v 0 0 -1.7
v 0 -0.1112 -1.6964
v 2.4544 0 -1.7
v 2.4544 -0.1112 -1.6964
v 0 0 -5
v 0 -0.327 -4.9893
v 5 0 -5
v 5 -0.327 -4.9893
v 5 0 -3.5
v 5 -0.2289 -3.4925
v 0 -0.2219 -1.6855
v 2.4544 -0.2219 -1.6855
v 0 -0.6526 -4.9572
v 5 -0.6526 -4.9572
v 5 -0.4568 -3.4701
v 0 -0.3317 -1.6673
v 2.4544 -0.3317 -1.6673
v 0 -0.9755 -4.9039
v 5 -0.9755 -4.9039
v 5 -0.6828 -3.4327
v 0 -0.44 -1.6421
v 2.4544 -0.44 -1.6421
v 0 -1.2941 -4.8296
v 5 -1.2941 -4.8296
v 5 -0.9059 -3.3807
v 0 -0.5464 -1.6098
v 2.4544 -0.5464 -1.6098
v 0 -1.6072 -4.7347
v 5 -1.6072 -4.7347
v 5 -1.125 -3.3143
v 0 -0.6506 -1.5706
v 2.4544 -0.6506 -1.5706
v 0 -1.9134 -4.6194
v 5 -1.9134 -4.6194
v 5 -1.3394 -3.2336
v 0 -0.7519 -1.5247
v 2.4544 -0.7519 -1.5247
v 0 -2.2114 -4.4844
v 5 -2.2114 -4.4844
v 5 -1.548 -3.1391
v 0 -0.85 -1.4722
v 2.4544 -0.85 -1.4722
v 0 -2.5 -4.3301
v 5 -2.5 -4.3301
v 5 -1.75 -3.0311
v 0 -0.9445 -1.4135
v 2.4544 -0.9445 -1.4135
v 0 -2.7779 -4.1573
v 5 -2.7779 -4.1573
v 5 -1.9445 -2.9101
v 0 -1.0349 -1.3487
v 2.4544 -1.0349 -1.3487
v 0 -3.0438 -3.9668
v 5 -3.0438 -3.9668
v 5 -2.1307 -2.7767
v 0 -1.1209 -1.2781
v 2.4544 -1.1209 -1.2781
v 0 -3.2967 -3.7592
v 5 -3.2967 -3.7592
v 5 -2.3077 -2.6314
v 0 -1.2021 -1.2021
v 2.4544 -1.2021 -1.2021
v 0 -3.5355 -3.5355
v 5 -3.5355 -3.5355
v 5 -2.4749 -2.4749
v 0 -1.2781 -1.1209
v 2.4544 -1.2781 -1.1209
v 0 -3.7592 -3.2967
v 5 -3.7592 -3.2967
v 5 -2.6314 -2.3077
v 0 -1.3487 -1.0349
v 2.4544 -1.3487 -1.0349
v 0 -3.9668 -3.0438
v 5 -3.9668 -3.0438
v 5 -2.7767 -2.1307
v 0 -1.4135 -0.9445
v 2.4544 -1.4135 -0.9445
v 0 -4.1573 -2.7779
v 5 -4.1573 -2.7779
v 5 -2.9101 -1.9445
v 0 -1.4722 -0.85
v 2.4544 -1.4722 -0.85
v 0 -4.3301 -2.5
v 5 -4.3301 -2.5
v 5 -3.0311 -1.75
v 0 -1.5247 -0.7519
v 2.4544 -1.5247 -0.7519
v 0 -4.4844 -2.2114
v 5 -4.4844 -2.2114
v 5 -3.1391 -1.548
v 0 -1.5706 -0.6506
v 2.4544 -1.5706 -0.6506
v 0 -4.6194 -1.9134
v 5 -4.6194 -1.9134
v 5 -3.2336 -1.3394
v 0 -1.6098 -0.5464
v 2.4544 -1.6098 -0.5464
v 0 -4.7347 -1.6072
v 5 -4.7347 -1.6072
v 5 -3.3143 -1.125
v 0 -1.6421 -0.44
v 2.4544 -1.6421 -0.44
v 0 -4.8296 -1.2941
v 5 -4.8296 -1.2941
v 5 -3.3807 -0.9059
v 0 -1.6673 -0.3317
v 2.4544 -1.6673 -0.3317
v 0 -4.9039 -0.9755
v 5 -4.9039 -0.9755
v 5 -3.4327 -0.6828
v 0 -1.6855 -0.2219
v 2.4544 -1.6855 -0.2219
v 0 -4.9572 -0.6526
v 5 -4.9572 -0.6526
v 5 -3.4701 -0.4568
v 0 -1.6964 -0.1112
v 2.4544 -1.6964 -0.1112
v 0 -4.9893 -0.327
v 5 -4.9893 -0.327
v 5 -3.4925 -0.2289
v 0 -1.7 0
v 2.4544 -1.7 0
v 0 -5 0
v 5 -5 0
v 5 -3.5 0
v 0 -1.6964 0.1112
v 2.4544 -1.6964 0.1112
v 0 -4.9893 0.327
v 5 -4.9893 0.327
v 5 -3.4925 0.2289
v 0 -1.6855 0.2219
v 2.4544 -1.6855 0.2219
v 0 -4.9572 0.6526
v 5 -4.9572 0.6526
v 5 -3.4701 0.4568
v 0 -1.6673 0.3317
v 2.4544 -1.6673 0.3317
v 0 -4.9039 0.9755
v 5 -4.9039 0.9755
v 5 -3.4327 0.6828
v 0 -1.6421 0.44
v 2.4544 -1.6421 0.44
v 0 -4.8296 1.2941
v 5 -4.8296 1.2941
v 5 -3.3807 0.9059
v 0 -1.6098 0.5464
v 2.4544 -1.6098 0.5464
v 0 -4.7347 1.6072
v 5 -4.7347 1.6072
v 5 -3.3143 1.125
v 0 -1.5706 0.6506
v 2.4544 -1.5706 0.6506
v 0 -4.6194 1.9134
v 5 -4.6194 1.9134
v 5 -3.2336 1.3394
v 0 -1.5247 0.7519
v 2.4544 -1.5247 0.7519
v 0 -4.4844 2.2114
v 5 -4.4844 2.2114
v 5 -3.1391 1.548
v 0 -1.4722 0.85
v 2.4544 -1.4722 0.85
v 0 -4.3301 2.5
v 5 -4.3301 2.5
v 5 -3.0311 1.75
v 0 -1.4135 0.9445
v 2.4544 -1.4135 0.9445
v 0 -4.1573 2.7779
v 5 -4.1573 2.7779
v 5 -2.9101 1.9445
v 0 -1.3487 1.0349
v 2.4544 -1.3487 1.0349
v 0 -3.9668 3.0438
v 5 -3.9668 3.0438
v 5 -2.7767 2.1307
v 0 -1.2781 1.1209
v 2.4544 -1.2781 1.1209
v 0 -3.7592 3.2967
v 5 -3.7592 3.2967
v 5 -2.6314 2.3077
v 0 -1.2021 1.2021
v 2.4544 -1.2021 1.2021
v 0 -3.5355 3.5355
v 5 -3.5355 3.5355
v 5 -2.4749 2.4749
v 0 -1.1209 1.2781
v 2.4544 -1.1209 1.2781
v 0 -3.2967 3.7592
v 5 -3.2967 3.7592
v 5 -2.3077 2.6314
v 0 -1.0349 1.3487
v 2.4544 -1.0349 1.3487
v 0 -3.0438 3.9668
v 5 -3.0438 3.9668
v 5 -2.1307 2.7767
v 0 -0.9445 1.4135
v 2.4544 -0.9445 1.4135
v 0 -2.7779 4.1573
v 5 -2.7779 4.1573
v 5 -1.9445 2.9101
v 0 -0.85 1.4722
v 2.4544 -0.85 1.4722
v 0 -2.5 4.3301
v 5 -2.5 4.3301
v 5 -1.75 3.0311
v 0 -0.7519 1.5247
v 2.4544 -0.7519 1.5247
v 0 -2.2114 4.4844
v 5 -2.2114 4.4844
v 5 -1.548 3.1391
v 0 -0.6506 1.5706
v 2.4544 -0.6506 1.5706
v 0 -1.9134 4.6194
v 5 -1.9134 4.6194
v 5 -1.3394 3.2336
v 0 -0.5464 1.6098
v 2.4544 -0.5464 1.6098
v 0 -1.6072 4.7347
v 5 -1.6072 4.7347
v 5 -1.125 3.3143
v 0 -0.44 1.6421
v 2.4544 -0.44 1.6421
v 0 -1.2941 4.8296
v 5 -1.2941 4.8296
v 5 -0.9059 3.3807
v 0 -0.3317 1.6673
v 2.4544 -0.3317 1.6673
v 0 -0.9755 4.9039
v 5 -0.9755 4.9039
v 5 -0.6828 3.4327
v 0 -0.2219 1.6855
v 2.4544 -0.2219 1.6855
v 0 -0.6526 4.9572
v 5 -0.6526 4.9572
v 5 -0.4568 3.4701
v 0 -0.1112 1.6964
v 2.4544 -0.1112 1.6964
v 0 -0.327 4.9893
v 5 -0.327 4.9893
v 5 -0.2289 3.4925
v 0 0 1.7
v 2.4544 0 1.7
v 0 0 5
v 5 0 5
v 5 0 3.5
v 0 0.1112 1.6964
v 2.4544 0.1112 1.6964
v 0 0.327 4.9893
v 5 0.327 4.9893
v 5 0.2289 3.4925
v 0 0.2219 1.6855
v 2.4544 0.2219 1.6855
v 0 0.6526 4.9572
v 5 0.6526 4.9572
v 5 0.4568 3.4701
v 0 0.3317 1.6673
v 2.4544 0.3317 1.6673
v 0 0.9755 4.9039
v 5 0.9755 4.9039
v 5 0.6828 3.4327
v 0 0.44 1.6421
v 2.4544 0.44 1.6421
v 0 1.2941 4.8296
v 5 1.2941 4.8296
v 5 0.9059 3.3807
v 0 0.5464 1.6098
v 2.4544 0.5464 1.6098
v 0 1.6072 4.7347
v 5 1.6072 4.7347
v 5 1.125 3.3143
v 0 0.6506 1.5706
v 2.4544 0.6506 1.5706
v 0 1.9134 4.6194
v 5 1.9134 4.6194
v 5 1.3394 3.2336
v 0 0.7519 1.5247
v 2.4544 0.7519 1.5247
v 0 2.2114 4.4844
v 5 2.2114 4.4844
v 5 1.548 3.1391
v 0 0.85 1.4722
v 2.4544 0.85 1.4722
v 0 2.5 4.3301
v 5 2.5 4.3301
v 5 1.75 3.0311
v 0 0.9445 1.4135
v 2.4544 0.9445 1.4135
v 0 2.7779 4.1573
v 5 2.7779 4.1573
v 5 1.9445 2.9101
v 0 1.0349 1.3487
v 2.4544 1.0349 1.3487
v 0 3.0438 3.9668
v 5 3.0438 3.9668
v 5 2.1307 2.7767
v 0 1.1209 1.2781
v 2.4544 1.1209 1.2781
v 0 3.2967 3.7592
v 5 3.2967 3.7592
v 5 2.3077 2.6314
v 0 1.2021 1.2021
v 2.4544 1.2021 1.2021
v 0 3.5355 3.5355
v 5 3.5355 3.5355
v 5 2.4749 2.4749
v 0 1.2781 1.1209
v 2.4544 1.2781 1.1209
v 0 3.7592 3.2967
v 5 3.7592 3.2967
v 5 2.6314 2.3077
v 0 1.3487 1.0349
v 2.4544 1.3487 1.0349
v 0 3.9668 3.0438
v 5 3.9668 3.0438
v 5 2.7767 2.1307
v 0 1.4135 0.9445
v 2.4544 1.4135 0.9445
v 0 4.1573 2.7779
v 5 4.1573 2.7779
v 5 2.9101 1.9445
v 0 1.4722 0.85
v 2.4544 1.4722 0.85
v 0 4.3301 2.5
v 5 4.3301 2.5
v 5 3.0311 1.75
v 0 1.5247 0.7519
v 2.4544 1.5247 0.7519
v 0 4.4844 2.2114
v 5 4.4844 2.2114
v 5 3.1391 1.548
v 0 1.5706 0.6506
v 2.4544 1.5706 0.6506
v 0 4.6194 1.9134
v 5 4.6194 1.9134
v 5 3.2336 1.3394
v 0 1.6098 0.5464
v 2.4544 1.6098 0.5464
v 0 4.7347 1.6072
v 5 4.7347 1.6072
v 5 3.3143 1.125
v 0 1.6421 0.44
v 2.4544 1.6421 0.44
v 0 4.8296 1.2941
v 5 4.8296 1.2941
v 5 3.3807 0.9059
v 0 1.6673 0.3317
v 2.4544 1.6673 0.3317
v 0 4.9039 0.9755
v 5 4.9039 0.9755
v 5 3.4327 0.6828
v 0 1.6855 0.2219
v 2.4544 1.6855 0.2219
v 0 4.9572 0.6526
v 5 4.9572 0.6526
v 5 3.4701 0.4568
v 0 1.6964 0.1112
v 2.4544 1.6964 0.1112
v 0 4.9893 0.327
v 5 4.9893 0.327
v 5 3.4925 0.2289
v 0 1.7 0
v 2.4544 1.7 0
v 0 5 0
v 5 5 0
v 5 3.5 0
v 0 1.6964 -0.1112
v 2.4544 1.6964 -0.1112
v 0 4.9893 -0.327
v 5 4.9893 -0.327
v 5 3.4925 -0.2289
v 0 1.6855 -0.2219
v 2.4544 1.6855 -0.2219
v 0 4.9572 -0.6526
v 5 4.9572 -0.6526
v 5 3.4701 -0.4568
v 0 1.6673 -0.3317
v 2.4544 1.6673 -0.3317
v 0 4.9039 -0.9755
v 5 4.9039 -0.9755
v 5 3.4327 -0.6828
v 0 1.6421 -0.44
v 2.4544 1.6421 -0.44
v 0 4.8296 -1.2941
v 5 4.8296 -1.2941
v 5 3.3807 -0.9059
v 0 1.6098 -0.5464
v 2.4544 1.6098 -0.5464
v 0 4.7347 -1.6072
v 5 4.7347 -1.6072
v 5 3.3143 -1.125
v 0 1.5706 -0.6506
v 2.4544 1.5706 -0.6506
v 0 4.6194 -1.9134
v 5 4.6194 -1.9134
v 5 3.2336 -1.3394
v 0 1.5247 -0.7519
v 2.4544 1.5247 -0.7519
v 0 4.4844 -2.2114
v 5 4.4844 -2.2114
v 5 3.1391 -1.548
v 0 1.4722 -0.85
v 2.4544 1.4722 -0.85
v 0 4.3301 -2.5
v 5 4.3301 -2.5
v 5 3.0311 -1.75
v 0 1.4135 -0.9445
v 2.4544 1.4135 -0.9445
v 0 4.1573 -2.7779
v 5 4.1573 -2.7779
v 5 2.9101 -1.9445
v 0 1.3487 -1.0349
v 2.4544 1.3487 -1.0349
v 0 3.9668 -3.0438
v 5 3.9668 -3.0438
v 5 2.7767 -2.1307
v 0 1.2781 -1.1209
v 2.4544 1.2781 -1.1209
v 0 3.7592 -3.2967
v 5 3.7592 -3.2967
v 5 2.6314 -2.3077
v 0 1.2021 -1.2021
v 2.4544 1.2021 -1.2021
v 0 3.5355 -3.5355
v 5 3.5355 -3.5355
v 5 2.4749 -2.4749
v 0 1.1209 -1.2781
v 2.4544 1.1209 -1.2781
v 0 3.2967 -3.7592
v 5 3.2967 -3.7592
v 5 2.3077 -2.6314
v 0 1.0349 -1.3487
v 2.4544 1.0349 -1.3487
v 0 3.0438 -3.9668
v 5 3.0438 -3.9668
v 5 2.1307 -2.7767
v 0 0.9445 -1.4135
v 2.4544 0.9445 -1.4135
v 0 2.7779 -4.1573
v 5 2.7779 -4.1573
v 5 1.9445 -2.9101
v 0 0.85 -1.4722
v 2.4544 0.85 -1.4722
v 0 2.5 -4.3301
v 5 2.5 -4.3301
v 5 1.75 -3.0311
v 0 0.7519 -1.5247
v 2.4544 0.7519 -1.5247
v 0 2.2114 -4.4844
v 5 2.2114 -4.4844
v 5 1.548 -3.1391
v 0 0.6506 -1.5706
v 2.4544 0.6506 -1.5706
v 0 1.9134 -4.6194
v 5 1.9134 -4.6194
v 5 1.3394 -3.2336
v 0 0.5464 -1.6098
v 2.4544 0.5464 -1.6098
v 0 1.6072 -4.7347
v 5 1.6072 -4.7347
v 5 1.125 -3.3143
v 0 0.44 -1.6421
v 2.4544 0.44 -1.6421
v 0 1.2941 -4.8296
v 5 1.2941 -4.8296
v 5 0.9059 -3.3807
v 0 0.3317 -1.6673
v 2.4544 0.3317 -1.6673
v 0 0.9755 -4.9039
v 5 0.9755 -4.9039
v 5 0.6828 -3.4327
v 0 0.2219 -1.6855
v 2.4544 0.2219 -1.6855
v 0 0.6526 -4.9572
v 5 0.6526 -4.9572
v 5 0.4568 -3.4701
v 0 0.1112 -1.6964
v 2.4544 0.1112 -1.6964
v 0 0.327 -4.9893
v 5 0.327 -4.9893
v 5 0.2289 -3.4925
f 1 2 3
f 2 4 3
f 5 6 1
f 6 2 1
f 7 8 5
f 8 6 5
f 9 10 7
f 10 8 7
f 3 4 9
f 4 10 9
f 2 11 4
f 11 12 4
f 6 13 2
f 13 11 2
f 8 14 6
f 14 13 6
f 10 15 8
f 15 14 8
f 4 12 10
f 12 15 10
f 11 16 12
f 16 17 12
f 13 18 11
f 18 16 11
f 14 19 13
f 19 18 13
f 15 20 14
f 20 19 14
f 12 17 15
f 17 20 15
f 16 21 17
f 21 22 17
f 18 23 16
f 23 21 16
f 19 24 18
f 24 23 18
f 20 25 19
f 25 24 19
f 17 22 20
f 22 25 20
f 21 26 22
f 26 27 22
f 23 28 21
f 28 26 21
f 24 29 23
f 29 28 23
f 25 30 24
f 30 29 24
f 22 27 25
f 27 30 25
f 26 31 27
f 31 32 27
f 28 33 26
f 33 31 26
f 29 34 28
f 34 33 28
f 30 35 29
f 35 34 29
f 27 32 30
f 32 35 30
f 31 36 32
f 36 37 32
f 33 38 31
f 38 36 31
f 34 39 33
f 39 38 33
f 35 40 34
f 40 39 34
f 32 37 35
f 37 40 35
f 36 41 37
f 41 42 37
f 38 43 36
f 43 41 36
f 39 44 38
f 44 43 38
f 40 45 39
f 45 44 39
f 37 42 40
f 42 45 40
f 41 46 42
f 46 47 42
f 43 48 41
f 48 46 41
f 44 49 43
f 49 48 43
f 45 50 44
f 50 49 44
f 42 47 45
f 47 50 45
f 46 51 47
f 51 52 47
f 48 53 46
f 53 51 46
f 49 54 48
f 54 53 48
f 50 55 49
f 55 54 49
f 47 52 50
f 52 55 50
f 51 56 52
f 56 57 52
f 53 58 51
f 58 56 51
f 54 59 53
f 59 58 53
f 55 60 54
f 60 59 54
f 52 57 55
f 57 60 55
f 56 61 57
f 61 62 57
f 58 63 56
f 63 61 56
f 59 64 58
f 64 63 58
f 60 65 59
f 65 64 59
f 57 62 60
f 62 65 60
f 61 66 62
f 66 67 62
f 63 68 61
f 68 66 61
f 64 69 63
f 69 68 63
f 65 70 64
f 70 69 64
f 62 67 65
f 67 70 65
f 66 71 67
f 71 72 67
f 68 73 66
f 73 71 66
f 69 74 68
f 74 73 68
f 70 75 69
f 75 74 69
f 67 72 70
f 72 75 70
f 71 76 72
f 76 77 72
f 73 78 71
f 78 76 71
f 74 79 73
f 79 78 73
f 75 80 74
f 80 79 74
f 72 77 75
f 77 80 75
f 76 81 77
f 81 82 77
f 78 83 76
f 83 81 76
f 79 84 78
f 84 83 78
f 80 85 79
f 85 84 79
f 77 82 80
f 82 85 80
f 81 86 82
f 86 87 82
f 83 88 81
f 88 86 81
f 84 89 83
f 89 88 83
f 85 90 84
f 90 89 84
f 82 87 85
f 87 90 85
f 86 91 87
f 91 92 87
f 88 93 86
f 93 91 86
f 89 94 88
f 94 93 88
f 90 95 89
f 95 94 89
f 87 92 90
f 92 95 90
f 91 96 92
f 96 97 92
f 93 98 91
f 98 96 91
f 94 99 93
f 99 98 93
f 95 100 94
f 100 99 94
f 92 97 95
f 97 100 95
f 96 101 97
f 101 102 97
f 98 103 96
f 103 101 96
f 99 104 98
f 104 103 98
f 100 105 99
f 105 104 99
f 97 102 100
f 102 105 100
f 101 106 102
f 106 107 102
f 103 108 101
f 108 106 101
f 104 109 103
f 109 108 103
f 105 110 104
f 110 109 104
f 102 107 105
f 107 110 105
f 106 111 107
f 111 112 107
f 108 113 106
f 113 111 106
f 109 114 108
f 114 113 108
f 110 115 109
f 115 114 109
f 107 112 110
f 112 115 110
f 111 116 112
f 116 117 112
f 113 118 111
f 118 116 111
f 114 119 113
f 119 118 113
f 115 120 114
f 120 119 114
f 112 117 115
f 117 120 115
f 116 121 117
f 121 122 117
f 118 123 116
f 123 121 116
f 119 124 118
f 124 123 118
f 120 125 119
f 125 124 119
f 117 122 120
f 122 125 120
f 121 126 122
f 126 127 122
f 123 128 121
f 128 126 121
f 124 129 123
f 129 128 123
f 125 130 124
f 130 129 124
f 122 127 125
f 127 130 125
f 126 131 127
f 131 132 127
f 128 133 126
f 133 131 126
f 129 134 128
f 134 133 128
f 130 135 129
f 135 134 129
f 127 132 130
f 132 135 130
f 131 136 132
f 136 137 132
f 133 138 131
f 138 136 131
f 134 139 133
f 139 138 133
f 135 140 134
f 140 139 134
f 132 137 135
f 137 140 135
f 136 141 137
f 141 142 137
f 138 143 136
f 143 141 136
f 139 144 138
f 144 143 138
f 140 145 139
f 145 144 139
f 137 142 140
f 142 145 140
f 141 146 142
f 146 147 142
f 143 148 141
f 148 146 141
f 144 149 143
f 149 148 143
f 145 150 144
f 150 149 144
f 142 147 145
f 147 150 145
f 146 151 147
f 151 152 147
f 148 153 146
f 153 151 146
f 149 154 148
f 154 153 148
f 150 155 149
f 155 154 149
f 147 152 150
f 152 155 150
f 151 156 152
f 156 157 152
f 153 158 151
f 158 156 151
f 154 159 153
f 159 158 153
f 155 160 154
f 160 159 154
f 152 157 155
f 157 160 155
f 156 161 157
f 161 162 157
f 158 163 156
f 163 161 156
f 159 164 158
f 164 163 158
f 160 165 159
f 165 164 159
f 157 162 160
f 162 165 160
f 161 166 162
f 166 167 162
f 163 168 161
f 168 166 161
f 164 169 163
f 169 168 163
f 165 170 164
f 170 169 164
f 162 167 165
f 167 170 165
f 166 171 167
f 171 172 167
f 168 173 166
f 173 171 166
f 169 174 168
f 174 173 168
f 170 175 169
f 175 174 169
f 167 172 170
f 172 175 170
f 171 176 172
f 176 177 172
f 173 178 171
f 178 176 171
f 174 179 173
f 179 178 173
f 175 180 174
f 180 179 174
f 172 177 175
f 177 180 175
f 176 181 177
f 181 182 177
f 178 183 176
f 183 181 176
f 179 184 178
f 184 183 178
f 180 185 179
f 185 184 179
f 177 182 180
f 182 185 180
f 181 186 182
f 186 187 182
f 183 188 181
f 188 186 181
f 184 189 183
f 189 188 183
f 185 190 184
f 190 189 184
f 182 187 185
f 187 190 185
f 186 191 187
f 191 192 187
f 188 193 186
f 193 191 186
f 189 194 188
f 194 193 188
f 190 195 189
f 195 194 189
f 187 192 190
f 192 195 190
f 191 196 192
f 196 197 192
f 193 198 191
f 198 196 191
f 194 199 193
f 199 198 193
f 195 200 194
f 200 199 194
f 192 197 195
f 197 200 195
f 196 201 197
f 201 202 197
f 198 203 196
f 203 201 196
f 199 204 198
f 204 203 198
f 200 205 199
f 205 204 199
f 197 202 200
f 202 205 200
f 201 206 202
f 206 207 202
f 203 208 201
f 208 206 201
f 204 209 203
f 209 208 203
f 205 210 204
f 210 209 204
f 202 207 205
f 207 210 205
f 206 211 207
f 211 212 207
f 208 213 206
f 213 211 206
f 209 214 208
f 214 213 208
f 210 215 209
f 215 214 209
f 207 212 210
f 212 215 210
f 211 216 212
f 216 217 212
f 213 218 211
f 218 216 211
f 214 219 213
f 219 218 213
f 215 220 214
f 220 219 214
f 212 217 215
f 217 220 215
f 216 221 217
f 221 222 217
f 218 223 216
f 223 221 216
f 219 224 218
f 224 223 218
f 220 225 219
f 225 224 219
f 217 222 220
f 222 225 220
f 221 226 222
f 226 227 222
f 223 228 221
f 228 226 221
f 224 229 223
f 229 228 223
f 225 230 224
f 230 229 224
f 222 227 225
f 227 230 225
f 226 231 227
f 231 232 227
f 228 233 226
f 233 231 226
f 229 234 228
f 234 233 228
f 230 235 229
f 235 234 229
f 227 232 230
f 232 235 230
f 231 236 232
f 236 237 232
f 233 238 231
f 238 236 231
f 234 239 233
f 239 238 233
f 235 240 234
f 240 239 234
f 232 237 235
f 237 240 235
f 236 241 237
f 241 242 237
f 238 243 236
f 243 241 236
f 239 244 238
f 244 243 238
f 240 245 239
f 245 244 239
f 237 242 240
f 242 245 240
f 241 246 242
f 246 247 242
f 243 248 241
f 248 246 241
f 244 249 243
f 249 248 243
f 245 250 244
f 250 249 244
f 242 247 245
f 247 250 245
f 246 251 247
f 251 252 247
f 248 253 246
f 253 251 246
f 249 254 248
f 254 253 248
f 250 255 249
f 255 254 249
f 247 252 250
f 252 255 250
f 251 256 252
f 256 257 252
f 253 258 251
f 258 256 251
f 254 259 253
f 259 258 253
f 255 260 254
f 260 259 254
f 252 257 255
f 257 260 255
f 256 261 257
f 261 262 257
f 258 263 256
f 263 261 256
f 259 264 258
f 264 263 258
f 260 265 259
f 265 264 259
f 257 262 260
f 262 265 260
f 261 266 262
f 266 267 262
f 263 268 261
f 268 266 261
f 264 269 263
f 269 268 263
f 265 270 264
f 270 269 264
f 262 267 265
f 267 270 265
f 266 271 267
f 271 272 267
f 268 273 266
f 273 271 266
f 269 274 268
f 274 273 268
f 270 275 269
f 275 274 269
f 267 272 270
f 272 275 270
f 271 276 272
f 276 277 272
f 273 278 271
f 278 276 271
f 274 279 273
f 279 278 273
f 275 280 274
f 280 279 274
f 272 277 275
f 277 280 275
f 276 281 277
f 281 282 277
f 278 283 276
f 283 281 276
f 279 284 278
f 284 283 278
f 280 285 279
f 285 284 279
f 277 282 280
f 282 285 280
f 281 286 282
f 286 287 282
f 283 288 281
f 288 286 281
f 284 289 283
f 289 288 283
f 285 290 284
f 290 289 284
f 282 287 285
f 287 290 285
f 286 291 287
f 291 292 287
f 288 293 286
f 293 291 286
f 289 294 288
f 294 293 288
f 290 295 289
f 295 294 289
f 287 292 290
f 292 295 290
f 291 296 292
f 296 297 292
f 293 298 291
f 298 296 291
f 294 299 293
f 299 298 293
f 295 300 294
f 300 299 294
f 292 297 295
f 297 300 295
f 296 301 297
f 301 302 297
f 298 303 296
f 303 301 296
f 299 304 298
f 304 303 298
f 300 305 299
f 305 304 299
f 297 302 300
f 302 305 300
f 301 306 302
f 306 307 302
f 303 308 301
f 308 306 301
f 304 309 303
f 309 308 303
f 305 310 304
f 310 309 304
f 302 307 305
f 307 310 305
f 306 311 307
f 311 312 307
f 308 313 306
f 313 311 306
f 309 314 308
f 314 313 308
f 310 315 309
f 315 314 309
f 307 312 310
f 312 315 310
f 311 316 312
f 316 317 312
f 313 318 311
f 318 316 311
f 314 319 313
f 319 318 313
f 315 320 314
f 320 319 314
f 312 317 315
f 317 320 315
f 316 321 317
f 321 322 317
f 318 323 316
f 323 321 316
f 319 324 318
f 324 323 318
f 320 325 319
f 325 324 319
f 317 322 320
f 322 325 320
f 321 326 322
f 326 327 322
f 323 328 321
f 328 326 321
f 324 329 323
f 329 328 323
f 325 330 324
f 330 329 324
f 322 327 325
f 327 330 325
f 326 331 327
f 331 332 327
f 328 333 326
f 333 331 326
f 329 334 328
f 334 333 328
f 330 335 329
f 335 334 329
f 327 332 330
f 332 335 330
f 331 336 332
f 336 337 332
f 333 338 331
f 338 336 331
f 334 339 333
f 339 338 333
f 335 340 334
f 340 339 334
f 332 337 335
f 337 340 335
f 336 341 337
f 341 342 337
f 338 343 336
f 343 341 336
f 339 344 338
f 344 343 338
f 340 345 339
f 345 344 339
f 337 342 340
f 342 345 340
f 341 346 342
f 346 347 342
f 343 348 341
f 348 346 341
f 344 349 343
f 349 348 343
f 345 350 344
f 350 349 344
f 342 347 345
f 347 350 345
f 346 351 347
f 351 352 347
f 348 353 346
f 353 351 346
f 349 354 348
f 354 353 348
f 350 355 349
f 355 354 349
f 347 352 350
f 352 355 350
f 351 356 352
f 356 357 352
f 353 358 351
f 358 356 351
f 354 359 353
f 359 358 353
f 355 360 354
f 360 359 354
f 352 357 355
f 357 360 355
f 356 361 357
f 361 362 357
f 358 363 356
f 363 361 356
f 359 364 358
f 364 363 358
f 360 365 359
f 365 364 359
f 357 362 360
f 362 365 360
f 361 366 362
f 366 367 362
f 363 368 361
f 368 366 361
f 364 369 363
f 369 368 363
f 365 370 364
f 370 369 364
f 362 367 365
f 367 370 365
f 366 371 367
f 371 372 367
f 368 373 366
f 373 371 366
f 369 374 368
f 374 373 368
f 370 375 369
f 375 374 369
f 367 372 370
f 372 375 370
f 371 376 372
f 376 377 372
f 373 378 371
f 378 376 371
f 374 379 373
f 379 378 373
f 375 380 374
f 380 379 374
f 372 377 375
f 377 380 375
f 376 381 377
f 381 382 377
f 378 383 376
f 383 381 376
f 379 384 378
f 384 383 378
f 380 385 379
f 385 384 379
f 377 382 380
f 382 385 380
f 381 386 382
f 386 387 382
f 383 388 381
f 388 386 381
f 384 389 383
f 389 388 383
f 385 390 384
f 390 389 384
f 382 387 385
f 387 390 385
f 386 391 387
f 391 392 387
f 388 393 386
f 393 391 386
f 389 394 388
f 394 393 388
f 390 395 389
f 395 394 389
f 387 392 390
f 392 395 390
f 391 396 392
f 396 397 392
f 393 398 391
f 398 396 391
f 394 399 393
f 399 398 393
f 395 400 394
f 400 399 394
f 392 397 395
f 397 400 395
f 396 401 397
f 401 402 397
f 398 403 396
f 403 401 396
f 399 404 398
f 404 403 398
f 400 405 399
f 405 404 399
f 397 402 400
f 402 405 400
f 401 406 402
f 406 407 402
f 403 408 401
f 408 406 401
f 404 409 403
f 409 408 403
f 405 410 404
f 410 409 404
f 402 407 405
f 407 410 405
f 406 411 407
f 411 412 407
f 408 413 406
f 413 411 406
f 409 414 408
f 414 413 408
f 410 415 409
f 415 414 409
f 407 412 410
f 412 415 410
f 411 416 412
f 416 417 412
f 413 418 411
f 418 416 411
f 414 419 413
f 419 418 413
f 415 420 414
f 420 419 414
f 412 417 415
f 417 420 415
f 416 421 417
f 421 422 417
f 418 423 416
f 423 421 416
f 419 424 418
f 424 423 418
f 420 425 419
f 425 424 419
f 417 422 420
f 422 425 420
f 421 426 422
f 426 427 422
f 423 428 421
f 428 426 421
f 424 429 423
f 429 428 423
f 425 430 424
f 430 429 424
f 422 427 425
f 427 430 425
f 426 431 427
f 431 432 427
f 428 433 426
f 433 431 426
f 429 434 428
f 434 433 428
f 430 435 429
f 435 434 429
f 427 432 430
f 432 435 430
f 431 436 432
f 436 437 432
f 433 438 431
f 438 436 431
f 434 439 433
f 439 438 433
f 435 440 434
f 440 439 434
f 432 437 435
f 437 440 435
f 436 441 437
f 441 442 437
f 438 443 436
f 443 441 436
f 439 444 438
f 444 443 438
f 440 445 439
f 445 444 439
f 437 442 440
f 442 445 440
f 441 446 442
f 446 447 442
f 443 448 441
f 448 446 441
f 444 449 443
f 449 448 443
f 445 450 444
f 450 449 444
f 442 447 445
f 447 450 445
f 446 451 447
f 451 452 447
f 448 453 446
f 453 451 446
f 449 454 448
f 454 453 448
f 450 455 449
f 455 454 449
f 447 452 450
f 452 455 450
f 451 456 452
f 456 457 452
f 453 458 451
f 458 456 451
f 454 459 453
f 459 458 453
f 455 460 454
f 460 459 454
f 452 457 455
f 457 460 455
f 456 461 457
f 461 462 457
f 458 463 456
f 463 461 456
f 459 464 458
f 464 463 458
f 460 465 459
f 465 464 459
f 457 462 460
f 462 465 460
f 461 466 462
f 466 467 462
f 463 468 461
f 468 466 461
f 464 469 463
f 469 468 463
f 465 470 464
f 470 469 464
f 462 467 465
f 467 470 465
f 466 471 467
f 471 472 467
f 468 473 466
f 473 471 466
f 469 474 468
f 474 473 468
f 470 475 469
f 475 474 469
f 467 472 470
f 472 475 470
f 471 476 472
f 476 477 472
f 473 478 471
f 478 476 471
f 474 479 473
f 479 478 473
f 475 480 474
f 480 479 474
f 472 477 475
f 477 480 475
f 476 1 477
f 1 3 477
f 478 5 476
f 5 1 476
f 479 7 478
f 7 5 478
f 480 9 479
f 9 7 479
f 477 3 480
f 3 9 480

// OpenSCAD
// file: ../../../conf/printer_config.scad
/**********************************************************************************************************************
 **
 ** conf/printer_config.scad
 **
 ** This file contains the main control variables that determine the size and shape of the printer. Note that in the
 ** actual parts specifications, the constants defined here will only ever be accessed through functions defined in
 ** conf/derived_sizes.scad exclusively to allow for easier adaptation, should the mode of calculation change. 
 **
 ** All sizes in mm. Caution: Little to no cross-checking is implemented. Change values sensibly and one at a time.
 **
 ** This file is NOT to be included by any other file except for conf/derived_sizes.scad.
 **
 **********************************************************************************************************************/

// ===== PRINTER CONFIGURATION ========================================================================================

// The length of the vertical MakerSlide extrusions that make up the rails for the carriages.
FRAME_V_RAIL_HEIGHT = 800;

// The length of the horizontal 20x20 V-Slot extrusions that form the sides of the triangle.
FRAME_H_RAIL_LENGTH = 400;

// ===== FABRICATED PART DIMENSIONS ===================================================================================

// The additional clearance to leave around the MakerSlide extrusion.
MAKERSLIDE_CLEARANCE = 0.05;

// The thickness of the walls outside the extruded parts.
FRAME_PART_WALL_THICKNESS = 3;

// The thickness of the wall that separates the vertical rails from the horizontal extrusions.
FRAME_V_H_RAIL_SEPARATION = 8;

// The depth of the holes that hold the V-Slot extrusions.
FRAME_PART_VSLOT_DEPTH = 30;

// The depth of the holes in the foot that hold the MakerSlide extrusions.
FRAME_FOOT_MAKERSLIDE_DEPTH = 25; 

// The height of the bracket that holds the motor. WARNING: Increasing this might make it difficult to 
// turn the screws that hold the motor.
FRAME_MOTOR_BRACKET_HEIGHT = 25;

// The height of the bracket that holds the intermediate level with the working surface (print bed).
FRAME_BED_BRACKET_HEIGHT = 25; 

// The depth of the holes in the head that hold the MakerSlide extrusions.
FRAME_HEAD_MAKERSLIDE_DEPTH = 35; 

// The thickness of the carriage base plate. A thicker plate will make the carriage stiffer, but cost more
// material to print and take away space from the working area.
CARRIAGE_PLATE_THICKNESS = 6;

// The width of the border around the holes in the carriage base plate that hold the V-Wheels. 
CARRIAGE_PLATE_BORDER_WIDTH = 8;

// The range by which the vertical belt tensioner can be adjusted.
TENSIONER_RANGE = 15;

// The distance between the rods that hold the effector.
ROD_DISTANCE = 65;

// The outer diameter of the rods.
ROD_OUTER_DIAMETER = 6;

// The inner diameter of the rods. Set to 0 if the rods are not hollow.
ROD_INNER_DIAMETER = 4;

// The additional clearance to leave between the rod and the holder.
ROD_CLEARANCE = 0.05;

// The thickness of the outer wall around the rod.
ROD_HOLDER_WALL_THICKNESS = 2;

// The depth of the insets that hold the rods.
ROD_HOLDER_DEPTH = 10;

// The thickness of the magnet holder arms.
MAGNET_HOLDER_THICKNESS = 5;

// The additional clearance to leave around the magnet holder pin.
MAGNET_CLEARANCE = 0.025;

// The upward angle of the ball holder on the carriage.
CARRIAGE_BALL_HOLDER_ANGLE = 10;

// The outward angle of the magnets in the effector.
EFFECTOR_MAGNET_ANGLE = 20;

// The outer diameter of the magnets in the effector.
EFFECTOR_MAGNET_DIAMETER = 15;

// The depth of the magnets in the effector.
EFFECTOR_MAGNET_DEPTH = 3;

// The thickness of the walls around the magnet.
EFFECTOR_MAGNET_WALL_THICKNESS = 3;

// The additional distance between the magnets on the effector (not the rod distance - the other one :-)).
// This value is added to the minimum distance determined by the magnet size and wall thickness.
EFFECTOR_MAGNET_ADDITIONAL_DISTANCE = 0;

// The minimal thickness of the effector plate. Note that if the magnet angle requires a thicker plate, the dimension
// will automatically be increased.
EFFECTOR_MIN_THICKNESS = 8;
// main file
/**********************************************************************************************************************
 **
 ** parts/vitamins/mechanic/magnet_ring.scad
 **
 ** This file renders a beveled ring magnet for the arm joints.
 **
 **********************************************************************************************************************/

include <../../../conf/part_sizes.scad>
include <../../../conf/derived_sizes.scad>

$fn = 96;
rotate([0, 90, 0]) 
	rotate_extrude()
		rotate([0, 0, 90])
		  	polygon(points = [
				[ 0, magnet_bore_diameter()/2],
				[ 0, magnet_outer_diameter()/2],
				[ magnet_height(), magnet_outer_diameter()/2],
				[ magnet_height(), magnet_bevel_diameter()/2],
				[ magnet_height() - magnet_bevel_depth(), magnet_bore_diameter()/2]
			]);
